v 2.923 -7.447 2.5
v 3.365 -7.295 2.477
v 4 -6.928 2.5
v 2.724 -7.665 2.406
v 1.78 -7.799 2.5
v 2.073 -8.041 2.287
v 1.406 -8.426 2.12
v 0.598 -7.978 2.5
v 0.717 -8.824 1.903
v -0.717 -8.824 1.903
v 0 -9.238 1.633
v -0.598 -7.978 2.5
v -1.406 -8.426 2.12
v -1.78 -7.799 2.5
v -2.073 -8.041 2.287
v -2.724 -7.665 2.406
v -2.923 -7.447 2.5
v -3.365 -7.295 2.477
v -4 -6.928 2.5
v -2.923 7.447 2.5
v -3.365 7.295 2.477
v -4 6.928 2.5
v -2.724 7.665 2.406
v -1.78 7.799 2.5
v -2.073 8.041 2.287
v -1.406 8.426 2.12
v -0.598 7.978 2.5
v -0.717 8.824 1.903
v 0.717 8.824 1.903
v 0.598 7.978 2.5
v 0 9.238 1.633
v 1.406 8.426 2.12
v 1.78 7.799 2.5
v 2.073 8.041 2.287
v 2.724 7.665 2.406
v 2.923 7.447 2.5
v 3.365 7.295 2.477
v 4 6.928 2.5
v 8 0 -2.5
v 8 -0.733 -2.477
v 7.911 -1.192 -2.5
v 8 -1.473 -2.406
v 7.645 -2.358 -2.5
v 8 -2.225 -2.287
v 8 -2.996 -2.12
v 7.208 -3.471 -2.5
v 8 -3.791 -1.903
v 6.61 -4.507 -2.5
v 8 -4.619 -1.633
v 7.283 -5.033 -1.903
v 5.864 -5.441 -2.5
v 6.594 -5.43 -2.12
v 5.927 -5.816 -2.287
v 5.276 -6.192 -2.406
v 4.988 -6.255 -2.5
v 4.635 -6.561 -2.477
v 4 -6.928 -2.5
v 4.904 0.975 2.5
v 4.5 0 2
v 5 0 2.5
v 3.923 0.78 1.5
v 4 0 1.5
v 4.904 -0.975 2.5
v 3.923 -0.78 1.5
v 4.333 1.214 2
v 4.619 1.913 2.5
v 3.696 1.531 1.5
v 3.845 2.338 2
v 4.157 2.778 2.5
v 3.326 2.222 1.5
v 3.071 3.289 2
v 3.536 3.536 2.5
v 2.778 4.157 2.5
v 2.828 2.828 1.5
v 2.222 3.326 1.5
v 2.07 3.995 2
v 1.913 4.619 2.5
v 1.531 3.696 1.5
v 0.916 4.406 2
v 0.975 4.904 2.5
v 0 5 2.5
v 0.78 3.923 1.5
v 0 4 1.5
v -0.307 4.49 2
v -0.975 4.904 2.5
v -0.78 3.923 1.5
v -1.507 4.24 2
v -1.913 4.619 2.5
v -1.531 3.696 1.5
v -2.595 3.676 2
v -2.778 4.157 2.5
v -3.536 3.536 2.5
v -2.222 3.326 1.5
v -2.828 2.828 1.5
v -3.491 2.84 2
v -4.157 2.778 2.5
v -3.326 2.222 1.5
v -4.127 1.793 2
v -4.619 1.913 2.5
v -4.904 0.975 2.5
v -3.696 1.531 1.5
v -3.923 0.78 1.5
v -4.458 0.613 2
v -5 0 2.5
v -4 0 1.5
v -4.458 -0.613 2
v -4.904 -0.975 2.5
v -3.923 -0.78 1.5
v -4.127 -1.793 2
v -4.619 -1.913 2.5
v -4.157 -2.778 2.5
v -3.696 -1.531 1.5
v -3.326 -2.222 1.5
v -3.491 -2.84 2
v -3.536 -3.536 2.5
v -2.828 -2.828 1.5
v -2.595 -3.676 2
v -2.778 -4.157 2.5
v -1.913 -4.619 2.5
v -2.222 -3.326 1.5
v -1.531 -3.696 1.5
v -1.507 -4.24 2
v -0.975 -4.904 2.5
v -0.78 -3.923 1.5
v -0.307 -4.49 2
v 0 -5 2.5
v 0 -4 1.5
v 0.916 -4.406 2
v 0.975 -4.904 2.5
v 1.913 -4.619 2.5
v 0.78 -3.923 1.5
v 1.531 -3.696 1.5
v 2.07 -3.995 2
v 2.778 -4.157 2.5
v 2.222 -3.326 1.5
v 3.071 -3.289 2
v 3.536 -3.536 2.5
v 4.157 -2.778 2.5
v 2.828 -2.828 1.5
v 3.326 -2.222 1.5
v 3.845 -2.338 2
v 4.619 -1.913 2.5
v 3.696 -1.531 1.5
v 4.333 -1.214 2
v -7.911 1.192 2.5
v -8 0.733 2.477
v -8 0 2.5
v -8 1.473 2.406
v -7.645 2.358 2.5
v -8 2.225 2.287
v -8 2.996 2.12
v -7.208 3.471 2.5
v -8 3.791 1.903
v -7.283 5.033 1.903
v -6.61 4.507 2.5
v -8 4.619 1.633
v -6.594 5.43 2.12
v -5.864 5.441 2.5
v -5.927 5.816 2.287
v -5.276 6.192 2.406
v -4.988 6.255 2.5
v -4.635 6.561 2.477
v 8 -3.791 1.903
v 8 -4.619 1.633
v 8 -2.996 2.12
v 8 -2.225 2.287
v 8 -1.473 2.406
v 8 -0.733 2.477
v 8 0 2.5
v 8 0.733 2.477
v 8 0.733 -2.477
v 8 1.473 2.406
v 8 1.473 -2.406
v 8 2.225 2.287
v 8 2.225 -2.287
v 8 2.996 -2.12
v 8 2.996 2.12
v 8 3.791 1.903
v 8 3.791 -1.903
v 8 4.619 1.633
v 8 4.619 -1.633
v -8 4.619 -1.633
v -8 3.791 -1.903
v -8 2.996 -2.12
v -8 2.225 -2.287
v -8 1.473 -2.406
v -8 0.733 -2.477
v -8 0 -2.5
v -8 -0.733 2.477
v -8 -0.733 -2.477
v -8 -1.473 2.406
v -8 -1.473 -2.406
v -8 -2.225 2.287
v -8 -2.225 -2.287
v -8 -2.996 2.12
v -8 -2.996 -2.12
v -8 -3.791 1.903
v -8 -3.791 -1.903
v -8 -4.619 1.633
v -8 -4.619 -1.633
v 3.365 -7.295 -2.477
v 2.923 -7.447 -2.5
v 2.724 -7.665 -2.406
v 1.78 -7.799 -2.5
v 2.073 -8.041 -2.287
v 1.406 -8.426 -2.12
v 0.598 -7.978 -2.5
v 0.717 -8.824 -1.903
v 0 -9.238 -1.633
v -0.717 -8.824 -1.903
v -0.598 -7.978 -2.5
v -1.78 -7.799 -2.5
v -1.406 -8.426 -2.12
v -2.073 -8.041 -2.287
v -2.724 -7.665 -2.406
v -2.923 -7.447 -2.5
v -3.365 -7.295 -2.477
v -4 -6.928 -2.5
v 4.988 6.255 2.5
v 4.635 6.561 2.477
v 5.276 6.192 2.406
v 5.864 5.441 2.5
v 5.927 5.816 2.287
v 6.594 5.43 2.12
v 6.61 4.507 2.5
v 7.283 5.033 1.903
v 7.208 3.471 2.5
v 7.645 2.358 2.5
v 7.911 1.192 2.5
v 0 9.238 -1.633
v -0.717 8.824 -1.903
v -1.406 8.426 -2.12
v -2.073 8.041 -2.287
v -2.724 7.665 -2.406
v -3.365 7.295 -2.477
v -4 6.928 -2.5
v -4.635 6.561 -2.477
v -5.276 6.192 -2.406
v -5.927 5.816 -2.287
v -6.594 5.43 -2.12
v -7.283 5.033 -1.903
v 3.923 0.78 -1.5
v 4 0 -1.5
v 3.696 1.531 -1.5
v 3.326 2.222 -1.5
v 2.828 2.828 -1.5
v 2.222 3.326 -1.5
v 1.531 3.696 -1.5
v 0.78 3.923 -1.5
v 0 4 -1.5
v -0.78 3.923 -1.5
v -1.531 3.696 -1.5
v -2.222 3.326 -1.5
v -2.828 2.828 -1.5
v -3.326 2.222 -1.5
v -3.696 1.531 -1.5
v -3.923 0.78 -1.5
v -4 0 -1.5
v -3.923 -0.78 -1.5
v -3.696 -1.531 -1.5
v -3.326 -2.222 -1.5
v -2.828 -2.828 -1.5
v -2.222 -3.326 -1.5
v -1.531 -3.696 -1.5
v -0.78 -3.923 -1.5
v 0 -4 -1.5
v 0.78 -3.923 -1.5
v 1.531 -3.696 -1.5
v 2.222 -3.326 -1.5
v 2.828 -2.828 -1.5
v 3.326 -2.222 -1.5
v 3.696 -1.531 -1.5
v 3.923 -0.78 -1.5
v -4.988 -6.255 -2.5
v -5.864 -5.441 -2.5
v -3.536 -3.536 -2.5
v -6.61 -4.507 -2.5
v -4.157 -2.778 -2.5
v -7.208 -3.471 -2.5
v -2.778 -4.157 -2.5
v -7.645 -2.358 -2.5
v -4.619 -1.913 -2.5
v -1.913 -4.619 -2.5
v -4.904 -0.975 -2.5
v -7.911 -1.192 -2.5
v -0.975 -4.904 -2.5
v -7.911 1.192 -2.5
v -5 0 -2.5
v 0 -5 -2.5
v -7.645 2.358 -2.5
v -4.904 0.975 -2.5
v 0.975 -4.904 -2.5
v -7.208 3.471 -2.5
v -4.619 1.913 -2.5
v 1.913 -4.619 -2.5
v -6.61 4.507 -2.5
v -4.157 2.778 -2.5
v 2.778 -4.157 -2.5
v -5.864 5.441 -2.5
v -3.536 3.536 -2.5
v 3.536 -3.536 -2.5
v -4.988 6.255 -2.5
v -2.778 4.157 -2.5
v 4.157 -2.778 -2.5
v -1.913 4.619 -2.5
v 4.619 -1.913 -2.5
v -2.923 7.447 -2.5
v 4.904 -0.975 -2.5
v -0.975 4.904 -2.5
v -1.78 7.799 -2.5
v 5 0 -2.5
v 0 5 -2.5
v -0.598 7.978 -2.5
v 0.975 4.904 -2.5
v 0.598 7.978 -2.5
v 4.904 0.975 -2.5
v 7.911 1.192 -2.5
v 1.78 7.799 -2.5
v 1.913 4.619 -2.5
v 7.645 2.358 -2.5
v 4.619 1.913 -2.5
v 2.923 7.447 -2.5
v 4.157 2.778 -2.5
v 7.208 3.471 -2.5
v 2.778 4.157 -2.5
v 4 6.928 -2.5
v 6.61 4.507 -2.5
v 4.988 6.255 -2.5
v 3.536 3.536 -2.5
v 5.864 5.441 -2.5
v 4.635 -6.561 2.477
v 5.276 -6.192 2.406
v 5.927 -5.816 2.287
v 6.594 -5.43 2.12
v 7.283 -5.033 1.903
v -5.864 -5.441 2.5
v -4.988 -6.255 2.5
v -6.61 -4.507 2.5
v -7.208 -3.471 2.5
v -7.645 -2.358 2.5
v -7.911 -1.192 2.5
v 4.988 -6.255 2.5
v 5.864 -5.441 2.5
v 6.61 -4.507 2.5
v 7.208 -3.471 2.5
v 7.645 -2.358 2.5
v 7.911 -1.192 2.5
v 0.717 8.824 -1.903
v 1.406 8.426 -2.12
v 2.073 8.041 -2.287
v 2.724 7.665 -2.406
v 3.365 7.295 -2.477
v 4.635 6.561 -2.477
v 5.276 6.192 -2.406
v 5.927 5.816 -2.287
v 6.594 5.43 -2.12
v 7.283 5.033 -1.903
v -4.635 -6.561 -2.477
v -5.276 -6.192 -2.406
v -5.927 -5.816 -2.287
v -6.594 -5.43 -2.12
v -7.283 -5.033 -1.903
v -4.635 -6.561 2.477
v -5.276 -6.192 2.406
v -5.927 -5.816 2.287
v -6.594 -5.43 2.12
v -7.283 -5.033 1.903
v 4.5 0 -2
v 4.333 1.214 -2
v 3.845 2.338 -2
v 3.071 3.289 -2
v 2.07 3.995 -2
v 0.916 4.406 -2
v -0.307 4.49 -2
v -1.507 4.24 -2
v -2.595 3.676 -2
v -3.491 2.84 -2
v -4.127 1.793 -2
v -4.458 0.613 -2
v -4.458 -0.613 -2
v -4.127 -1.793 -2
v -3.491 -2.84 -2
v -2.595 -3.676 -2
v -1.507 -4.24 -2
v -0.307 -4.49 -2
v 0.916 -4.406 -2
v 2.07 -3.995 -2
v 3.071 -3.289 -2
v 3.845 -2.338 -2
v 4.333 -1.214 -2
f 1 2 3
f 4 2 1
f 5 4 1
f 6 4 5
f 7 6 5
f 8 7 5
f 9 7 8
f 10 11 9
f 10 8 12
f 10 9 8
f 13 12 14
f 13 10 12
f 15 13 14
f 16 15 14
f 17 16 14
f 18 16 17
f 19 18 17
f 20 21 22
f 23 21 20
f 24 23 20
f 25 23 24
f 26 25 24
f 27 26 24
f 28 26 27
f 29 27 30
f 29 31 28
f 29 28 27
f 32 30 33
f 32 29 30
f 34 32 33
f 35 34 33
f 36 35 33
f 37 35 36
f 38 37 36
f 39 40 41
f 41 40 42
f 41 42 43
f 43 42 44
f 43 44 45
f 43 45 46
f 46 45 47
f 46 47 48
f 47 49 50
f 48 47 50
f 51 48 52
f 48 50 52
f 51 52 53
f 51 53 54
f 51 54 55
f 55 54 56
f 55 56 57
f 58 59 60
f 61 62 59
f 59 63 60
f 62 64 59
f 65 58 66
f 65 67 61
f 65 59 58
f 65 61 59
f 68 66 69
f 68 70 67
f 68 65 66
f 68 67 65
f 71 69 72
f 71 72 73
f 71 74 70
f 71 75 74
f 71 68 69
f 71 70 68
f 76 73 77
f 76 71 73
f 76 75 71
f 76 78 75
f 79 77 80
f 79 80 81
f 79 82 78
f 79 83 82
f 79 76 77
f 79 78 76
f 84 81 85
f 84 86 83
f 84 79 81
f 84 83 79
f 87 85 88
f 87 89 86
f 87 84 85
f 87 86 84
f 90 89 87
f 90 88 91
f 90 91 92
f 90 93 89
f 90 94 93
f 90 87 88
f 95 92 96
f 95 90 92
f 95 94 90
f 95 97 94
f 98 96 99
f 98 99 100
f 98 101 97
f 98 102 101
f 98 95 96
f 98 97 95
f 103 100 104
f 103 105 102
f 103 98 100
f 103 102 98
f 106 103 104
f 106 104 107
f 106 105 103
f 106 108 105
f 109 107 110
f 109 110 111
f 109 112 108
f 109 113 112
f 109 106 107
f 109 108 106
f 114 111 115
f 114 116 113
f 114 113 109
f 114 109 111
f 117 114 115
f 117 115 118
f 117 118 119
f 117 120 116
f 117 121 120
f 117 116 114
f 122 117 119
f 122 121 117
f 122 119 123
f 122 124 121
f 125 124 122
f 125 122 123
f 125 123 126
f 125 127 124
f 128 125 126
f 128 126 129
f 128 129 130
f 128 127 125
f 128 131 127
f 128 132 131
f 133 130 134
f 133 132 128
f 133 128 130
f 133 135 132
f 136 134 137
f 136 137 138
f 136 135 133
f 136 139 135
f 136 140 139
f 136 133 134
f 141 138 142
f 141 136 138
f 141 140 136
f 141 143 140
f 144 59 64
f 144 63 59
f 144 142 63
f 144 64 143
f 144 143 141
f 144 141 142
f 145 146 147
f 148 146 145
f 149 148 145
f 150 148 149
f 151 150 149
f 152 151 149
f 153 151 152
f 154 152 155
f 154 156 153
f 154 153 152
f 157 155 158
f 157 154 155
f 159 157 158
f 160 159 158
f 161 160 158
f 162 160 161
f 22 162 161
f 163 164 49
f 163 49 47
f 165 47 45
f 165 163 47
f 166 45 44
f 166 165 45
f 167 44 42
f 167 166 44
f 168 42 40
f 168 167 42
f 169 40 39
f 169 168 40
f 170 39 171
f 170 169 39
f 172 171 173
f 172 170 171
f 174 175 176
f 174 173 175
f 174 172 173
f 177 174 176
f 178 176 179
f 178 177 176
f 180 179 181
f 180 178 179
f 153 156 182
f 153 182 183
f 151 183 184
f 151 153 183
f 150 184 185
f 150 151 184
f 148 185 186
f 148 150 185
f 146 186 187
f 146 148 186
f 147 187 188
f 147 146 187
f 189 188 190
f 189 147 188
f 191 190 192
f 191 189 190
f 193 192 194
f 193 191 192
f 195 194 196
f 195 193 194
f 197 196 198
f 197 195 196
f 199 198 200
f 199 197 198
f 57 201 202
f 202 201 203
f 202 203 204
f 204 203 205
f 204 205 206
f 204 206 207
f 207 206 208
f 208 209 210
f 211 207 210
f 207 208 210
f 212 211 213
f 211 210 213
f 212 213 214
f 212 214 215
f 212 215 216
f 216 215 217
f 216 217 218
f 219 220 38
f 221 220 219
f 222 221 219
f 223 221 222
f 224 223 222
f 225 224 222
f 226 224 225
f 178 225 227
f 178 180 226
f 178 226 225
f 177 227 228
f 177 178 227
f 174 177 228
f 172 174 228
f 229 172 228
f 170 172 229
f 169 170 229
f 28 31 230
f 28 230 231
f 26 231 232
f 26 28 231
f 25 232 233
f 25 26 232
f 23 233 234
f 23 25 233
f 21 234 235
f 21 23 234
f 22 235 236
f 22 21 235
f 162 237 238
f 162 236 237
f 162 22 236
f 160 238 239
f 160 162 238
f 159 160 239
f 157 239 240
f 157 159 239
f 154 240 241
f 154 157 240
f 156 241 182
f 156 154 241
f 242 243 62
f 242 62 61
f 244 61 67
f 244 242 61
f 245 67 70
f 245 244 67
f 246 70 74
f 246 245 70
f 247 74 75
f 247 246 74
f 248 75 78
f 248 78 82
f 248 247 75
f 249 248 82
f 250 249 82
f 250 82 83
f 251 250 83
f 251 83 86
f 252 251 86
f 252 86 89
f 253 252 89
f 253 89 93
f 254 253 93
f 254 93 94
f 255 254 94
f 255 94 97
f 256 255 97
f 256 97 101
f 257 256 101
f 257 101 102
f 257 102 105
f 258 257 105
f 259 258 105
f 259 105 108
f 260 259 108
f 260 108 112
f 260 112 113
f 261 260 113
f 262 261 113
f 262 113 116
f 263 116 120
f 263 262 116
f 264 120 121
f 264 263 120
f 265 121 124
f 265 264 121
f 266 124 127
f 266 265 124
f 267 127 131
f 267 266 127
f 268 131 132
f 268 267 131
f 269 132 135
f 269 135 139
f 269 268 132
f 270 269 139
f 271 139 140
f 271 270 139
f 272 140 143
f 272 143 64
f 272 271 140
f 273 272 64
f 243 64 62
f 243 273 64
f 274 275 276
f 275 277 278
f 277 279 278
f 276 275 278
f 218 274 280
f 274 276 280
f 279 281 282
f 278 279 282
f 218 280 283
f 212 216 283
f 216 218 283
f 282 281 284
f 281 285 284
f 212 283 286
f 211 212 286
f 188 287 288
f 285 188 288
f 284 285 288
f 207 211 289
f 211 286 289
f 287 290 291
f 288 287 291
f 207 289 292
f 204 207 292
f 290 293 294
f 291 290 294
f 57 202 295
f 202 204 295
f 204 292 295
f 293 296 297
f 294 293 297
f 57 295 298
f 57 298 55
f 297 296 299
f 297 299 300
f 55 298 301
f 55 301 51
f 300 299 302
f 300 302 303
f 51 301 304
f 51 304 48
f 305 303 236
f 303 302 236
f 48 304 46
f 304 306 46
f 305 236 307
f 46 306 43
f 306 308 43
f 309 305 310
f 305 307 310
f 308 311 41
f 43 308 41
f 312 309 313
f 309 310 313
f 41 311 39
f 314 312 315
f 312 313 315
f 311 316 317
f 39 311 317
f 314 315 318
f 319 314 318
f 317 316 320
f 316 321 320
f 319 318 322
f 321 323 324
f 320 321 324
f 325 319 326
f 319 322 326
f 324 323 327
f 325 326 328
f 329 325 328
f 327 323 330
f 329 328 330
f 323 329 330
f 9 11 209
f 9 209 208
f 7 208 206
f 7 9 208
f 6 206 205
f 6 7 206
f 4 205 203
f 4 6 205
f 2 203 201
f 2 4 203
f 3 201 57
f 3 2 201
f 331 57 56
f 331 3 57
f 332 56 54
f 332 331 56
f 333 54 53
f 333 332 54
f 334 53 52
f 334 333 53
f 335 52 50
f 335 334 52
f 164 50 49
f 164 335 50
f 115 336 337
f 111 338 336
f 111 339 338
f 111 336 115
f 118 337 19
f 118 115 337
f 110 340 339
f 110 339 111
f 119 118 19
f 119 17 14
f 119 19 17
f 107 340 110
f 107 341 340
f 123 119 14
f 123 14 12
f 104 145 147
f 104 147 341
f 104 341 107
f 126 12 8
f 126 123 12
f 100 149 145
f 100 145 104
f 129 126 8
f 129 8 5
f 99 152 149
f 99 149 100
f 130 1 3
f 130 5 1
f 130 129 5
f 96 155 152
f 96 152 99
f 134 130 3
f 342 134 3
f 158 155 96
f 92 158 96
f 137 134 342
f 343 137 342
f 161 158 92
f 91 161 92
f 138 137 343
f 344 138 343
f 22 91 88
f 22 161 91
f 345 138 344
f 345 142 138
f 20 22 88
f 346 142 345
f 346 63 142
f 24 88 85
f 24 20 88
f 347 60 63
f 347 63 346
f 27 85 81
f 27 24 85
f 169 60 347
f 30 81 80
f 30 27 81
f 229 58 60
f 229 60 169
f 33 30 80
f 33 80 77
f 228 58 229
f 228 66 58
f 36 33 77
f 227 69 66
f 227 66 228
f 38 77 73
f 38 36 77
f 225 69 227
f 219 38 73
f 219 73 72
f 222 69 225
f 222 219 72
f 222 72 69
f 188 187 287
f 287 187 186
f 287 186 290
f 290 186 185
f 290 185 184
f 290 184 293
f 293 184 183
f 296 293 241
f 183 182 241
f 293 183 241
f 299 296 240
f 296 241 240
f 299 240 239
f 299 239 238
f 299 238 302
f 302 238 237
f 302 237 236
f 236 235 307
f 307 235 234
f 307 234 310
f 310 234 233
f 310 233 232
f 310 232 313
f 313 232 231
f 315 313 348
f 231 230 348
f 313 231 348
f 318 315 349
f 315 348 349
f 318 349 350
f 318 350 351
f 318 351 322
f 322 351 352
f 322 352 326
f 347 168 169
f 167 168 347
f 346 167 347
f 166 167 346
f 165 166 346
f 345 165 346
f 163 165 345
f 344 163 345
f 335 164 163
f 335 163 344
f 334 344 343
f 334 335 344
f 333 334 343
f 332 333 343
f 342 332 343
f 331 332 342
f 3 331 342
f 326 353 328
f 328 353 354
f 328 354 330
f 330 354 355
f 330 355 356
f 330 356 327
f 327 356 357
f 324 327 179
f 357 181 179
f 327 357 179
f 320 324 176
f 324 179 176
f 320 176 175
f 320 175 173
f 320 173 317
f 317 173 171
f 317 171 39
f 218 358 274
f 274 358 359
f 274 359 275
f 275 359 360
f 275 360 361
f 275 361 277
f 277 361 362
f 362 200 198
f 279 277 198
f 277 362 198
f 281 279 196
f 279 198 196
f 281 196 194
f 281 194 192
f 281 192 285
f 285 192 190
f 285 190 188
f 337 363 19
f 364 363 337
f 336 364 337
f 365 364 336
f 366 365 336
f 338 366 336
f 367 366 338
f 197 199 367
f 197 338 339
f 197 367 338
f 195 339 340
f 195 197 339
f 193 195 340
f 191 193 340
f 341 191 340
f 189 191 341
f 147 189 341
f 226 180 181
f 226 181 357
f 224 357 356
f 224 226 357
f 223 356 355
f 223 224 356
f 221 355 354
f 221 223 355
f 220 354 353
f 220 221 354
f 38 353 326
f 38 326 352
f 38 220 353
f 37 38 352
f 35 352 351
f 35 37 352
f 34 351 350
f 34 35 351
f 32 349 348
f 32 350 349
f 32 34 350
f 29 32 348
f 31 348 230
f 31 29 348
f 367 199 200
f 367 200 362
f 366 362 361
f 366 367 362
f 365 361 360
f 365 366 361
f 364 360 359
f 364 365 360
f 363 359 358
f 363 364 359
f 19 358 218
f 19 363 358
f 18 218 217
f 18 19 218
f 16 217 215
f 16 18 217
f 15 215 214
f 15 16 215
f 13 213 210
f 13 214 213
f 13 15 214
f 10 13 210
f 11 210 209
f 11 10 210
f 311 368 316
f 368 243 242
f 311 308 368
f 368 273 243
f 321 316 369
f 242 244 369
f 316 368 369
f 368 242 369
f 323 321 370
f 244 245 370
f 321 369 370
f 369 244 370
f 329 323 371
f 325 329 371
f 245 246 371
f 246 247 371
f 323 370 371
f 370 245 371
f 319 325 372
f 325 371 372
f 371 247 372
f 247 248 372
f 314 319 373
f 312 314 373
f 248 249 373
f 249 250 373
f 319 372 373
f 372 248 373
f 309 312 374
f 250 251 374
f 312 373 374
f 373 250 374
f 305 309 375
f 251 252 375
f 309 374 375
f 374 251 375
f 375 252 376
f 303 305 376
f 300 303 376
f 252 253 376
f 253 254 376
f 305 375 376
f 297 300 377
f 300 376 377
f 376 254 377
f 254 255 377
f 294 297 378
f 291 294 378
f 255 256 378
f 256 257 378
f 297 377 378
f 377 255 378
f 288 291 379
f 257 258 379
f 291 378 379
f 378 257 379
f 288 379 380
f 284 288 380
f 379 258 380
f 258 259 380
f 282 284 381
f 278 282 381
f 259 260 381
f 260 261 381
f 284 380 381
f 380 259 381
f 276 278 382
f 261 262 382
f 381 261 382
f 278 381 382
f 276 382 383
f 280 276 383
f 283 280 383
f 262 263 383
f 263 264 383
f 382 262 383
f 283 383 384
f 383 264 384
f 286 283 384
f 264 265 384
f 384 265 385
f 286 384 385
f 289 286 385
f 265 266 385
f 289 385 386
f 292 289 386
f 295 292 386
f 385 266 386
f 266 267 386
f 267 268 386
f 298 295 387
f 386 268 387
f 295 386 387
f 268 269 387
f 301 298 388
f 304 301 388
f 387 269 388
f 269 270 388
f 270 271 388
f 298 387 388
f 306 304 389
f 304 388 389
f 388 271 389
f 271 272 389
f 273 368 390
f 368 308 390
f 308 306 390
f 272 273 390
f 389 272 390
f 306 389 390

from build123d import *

# Parameters (mm, degrees)
SKETCH1_R           = 4
BOSS_EXTRUDE1_DEPTH = 2.5
SKETCH2_OUTSIDE_W   = 40.128
SKETCH2_OUTSIDE_H   = 42.604
SKETCH2_OUTSIDE_R   = 8
CUT_EXTRUDE1_DEPTH  = 6
CUT_EXTRUDE1_TAPER  = 55
CHAMFER1_SIZE       = 1


with BuildPart() as part:
    # Sketch1 → Boss-Extrude1 (new body, symmetric)
    with BuildSketch(Plane.XY):
        Polygon((-8, 4.618802154), (-8, -4.618802154), (0, -9.237604307), (8, -4.618802154), (8, 4.618802154), (0, 9.237604307), align=None)
        Circle(SKETCH1_R, mode=Mode.SUBTRACT)
    extrude(amount=BOSS_EXTRUDE1_DEPTH, both=True)

    # Sketch2 outside → Cut-Extrude1 (cut, through all)
    with BuildSketch(Plane.XY.offset(2.5)):
        Rectangle(SKETCH2_OUTSIDE_W, SKETCH2_OUTSIDE_H)
        Circle(SKETCH2_OUTSIDE_R, mode=Mode.SUBTRACT)
    cut_extrude1 = extrude(amount=-CUT_EXTRUDE1_DEPTH, taper=CUT_EXTRUDE1_TAPER, mode=Mode.SUBTRACT)

    # Mirror1: Cut-Extrude1 across plane
    add(cut_extrude1.mirror(Plane.XY), mode=Mode.SUBTRACT)

    # Chamfer1
    chamfer1_edges = [part.edges().sort_by_distance(p)[0] for p in [
        (-4, 0, -2.5),
        (-4, 0, 2.5),
    ]]
    chamfer(chamfer1_edges, length=CHAMFER1_SIZE)


solid = part.part
